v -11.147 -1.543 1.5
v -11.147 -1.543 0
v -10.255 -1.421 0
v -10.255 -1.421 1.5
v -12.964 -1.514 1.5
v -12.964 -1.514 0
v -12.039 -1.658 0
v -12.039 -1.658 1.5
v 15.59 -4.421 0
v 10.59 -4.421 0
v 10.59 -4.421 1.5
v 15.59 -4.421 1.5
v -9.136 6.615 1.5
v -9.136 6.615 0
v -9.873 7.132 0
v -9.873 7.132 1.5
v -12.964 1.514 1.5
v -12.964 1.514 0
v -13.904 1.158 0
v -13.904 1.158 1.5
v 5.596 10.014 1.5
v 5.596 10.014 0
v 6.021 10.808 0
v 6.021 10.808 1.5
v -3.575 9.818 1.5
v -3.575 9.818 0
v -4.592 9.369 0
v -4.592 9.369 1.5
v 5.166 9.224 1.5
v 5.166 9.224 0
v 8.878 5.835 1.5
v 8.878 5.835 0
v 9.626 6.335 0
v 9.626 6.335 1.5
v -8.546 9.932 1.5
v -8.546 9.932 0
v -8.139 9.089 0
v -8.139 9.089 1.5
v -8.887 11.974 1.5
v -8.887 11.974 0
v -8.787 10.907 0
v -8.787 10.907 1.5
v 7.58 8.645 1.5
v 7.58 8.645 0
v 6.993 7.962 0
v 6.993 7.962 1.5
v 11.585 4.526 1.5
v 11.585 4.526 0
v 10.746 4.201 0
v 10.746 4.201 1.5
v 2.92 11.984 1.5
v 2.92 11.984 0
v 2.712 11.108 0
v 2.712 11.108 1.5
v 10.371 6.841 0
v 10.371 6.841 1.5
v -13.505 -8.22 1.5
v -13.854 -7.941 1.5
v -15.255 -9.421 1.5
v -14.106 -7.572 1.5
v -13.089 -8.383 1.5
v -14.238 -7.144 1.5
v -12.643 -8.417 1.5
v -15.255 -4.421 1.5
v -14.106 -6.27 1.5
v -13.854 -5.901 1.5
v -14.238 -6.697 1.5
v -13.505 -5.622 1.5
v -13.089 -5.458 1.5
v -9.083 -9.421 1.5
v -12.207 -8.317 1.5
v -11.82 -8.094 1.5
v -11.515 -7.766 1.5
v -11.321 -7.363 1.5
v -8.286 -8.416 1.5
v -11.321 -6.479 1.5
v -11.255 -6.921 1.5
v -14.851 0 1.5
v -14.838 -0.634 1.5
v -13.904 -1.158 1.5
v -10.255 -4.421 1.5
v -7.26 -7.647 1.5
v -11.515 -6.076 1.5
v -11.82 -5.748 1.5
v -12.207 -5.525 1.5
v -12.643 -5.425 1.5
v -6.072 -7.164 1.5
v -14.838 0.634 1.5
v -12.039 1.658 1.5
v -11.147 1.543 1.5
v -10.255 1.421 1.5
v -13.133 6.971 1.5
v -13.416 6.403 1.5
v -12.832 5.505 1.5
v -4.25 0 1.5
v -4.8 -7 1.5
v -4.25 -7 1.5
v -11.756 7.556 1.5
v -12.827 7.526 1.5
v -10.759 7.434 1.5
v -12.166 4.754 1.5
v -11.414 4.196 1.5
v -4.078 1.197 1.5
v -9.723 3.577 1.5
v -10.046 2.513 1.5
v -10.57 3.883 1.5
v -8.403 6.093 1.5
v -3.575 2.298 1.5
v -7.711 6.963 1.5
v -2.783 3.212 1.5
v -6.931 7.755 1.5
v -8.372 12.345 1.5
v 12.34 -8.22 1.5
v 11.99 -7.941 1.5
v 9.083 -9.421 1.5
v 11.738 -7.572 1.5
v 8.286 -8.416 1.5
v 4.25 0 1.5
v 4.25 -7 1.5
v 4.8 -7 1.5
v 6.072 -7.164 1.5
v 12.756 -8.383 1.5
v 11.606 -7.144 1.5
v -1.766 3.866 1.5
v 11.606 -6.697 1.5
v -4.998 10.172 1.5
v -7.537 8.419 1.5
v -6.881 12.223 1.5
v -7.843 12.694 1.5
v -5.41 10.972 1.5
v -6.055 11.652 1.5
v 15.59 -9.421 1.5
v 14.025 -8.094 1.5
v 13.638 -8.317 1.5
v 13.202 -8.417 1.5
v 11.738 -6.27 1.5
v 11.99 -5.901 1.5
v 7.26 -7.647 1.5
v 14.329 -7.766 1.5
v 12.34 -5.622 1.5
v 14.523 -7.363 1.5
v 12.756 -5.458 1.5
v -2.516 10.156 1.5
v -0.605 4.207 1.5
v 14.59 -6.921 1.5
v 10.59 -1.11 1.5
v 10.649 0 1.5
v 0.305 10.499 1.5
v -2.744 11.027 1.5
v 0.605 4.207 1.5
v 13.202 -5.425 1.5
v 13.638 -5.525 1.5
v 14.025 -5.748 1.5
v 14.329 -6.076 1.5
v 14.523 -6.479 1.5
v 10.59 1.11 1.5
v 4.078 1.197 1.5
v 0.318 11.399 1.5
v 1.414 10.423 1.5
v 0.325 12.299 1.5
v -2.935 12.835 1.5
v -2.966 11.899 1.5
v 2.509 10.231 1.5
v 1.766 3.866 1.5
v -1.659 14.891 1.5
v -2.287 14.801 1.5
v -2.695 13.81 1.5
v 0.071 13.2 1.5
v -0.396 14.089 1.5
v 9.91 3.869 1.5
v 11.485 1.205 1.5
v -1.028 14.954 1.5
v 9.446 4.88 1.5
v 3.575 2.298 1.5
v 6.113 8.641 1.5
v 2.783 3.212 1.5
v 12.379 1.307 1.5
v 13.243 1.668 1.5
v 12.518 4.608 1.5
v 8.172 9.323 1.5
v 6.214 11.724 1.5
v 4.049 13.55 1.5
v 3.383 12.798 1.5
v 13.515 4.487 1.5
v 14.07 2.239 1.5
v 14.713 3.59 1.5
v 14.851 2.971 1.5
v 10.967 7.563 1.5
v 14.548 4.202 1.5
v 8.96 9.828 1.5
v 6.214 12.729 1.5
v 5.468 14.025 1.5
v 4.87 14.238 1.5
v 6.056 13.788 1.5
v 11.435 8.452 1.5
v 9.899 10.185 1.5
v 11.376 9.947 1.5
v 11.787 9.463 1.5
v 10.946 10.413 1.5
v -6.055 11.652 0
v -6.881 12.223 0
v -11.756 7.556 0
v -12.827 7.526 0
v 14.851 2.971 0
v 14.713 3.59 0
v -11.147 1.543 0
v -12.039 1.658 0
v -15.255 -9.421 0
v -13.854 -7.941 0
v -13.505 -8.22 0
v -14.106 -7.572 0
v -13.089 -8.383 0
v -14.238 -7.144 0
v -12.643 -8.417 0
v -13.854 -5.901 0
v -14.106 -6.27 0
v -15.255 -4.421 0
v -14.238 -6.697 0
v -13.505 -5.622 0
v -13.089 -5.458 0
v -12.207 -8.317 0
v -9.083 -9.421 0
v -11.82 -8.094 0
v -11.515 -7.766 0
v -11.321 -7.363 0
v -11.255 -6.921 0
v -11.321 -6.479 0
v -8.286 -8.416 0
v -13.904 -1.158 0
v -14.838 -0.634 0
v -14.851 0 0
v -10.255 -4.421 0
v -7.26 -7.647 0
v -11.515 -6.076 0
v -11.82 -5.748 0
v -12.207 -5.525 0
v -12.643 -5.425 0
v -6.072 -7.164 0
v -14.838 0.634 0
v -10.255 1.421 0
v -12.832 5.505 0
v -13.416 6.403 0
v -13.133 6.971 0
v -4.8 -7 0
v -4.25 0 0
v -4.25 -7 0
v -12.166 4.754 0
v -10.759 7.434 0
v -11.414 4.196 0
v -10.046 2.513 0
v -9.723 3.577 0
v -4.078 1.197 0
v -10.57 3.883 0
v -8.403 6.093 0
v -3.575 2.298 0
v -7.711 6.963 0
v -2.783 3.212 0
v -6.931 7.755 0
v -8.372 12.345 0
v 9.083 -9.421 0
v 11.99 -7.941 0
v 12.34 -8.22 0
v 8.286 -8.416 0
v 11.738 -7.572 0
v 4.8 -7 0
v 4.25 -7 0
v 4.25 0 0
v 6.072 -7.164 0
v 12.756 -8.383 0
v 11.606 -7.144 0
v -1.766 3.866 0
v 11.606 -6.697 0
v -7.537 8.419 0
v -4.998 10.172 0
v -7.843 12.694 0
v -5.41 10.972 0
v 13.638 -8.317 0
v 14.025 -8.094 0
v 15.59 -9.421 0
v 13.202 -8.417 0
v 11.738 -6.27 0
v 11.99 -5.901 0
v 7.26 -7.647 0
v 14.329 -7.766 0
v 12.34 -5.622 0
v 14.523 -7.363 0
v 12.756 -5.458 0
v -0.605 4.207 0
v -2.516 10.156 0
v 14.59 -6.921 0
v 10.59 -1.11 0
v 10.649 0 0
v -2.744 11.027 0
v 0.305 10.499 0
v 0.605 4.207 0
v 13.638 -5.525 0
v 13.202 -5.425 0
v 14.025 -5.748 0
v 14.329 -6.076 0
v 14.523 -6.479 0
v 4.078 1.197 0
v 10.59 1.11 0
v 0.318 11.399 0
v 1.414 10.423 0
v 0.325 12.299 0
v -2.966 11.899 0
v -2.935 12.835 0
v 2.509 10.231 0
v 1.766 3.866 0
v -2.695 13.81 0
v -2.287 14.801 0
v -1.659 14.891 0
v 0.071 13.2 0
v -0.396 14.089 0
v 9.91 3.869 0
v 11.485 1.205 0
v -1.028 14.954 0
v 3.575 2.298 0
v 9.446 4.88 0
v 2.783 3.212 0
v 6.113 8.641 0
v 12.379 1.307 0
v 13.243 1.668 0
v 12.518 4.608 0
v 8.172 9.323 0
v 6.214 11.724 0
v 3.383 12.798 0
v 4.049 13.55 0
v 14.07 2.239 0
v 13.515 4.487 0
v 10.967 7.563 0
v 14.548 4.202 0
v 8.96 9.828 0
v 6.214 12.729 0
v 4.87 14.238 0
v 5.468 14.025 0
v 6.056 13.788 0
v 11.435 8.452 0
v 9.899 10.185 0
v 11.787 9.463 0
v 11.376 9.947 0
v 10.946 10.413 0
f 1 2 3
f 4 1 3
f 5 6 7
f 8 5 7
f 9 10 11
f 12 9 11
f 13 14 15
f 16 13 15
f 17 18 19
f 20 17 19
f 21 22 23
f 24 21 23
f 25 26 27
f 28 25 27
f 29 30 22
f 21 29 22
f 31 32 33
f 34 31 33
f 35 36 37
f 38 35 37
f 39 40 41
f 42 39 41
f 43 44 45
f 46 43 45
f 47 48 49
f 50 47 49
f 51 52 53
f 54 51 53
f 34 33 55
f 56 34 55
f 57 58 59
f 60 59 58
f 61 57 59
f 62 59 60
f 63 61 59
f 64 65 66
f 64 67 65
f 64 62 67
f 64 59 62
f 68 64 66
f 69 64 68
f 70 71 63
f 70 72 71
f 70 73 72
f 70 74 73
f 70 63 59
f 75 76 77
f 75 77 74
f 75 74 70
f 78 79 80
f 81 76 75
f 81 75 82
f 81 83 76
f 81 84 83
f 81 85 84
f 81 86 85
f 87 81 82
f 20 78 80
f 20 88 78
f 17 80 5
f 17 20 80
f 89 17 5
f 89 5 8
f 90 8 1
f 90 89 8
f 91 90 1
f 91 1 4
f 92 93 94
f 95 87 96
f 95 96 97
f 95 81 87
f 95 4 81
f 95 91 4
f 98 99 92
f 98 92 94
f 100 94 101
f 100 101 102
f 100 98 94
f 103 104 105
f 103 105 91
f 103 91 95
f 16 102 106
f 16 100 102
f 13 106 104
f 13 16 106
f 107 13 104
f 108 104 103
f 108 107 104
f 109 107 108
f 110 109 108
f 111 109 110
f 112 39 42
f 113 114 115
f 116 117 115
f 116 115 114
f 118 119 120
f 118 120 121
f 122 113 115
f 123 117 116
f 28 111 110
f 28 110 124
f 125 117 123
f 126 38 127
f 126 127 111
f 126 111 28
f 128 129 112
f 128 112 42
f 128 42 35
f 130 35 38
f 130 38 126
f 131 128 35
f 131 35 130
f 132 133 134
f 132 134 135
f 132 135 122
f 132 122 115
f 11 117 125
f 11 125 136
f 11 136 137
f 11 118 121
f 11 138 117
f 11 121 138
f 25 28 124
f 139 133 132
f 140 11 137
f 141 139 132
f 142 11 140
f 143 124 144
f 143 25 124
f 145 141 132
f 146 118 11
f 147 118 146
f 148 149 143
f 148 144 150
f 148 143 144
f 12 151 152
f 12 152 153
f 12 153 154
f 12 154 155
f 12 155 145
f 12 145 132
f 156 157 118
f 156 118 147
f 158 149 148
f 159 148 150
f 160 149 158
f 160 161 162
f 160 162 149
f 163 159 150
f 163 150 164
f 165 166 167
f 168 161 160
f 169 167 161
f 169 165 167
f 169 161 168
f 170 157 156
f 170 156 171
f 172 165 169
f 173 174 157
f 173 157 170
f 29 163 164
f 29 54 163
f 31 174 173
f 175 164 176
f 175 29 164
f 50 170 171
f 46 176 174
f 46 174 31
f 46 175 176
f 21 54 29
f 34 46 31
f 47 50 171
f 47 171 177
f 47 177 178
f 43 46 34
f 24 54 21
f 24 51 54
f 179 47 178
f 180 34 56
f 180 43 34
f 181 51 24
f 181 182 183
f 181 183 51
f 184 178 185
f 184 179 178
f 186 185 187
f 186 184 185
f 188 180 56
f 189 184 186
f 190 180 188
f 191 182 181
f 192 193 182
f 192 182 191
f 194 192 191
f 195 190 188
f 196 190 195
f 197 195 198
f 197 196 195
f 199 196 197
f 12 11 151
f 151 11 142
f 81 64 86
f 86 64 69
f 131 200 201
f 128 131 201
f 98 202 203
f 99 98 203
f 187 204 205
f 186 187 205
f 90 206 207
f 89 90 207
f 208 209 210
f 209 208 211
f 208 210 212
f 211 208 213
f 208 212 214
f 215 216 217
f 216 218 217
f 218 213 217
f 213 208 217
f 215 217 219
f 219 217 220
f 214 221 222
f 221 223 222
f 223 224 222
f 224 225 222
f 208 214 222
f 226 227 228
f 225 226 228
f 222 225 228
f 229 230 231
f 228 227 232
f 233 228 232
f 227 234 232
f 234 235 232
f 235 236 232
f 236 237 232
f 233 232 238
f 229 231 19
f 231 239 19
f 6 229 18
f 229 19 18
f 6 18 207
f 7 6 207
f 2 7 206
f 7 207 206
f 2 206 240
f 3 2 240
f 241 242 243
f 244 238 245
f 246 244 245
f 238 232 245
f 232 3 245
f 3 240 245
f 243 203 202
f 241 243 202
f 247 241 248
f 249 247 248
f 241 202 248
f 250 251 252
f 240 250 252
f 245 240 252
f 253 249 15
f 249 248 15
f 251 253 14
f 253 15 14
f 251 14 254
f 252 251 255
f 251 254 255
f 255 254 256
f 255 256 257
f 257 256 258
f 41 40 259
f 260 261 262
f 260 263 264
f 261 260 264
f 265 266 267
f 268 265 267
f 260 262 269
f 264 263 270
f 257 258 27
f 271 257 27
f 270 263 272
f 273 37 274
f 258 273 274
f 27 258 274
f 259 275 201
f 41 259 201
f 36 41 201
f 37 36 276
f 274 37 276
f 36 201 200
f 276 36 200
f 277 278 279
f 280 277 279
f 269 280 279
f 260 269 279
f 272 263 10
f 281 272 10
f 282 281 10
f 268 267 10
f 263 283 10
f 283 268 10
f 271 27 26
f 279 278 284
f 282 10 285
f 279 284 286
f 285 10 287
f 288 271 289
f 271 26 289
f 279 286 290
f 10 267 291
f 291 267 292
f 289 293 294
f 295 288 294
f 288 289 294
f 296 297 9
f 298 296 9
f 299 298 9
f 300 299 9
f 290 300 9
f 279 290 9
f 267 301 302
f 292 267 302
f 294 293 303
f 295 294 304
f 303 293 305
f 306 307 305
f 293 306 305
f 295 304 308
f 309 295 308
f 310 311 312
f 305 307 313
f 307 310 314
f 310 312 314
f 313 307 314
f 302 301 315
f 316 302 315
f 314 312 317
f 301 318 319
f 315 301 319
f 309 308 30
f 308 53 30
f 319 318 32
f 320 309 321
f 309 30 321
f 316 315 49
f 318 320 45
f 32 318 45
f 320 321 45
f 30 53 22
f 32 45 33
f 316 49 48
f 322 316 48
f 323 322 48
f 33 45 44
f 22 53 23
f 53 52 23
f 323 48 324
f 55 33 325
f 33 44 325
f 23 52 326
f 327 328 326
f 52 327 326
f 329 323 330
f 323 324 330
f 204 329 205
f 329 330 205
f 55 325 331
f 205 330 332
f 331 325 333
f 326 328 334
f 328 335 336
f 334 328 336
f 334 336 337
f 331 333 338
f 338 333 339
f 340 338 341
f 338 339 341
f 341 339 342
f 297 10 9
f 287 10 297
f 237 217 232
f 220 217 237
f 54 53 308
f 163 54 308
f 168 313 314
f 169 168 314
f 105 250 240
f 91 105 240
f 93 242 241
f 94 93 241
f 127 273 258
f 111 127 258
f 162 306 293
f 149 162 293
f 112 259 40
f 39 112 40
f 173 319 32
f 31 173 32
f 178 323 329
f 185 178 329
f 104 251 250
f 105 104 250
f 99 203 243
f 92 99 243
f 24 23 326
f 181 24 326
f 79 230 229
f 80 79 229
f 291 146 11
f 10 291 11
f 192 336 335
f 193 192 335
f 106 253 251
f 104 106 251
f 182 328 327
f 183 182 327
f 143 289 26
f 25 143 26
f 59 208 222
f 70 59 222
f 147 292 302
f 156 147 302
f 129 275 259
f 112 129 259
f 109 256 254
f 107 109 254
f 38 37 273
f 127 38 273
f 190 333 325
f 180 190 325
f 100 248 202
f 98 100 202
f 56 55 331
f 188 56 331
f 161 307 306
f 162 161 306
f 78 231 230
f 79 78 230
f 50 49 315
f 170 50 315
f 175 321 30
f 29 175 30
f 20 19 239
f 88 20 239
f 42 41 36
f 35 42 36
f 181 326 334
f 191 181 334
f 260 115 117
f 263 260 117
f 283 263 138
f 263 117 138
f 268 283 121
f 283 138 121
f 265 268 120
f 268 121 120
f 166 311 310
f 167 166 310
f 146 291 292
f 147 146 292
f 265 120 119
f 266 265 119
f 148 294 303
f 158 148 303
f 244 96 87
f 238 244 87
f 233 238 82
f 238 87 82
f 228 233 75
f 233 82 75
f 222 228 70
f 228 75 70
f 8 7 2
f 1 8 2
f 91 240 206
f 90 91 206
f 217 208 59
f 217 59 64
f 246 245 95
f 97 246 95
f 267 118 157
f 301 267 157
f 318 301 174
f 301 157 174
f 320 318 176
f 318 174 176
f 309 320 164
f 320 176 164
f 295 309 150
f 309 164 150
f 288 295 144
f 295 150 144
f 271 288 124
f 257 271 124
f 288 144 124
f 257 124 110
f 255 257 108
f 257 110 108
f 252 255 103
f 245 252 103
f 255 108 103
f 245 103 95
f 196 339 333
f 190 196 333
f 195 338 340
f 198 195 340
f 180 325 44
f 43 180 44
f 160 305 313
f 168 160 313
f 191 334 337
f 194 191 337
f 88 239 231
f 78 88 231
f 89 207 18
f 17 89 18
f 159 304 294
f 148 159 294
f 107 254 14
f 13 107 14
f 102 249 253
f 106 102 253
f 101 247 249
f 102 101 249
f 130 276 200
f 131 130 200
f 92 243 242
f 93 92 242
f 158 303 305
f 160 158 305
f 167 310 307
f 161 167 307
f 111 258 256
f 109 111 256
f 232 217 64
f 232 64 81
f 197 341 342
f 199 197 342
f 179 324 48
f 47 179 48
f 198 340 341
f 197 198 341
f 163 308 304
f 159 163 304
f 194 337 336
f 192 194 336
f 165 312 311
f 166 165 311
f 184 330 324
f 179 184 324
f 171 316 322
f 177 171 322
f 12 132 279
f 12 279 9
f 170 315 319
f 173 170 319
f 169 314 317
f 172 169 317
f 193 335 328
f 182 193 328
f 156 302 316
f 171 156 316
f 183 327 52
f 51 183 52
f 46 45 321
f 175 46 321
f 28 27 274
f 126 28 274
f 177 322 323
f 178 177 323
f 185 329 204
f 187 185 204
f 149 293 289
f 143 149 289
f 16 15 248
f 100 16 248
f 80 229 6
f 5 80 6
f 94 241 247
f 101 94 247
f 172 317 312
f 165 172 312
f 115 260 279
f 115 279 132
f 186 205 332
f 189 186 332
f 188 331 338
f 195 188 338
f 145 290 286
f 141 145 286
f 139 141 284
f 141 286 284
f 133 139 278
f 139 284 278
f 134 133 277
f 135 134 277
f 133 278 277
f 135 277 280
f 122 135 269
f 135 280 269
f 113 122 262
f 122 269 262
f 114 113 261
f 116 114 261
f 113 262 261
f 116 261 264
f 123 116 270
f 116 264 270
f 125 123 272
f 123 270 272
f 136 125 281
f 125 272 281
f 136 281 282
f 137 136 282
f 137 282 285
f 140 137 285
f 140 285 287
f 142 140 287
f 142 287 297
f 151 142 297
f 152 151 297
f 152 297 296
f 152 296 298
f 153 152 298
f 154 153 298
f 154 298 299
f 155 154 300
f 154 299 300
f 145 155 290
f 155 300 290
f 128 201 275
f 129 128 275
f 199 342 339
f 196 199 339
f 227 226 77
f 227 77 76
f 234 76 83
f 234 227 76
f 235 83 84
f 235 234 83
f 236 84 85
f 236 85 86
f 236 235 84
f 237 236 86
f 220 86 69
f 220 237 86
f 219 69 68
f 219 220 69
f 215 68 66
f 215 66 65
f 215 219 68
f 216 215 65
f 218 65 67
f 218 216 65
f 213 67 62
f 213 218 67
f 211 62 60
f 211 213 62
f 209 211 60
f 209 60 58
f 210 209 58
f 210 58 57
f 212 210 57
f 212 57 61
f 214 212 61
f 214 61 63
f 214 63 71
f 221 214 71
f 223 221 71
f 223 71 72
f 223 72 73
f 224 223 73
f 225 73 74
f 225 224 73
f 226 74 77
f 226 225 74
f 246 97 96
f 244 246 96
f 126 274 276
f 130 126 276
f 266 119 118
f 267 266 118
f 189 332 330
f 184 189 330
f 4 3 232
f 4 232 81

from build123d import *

# Parameters (mm, degrees)
F1_DEPTH  = 1.5
F3_DEPTH  = 1.5
F4_W      = 6.004848
F4_H      = 1.5
F4_W_2    = 6.339723
F5_DEPTH  = 8
F6_W      = 5
F6_H      = 1.5
F7_DEPTH  = 5
F8_R      = 1.5
F9_DEPTH  = 1.5
F10_W     = 5
F10_H     = 5
F10_R     = 1.5
F11_DEPTH = 1.5
F13_DEPTH = 1.5


with BuildPart() as f1:
    # F0 (on Top) → F1 (new body)
    with BuildSketch(Plane.XY):
        Polygon((10.589723, -1.110145), (10.648575, 0), (10.589723, 1.110145), (11.484679, 1.205301), (12.378936, 1.30701), (13.242702, 1.66848), (14.069737, 2.238581), (14.851424, 2.970895), (14.712702, 3.589735), (14.547945, 4.202158), (13.515472, 4.487322), (12.51823, 4.607779), (11.58542, 4.526432), (10.746328, 4.200909), (9.909663, 3.869259), (9.445863, 4.879593), (8.877842, 5.835228), (9.626065, 6.335391), (10.370624, 6.841032), (10.967468, 7.56251), (11.434831, 8.451652), (11.786658, 9.463352), (11.376236, 9.94684), (10.945744, 10.412547), (9.899012, 10.185233), (8.960019, 9.828451), (8.17186, 9.322923), (7.580159, 8.644742), (6.993455, 7.962262), (6.113255, 8.641331), (5.166192, 9.223531), (5.596273, 10.014119), (6.020563, 10.807856), (6.213755, 11.72406), (6.21438, 12.728551), (6.055747, 13.787869), (5.467648, 14.025244), (4.870041, 14.237547), (4.048845, 13.54983), (3.383212, 12.797544), (2.920263, 11.983645), (2.711504, 11.108168), (2.509167, 10.231207), (1.41421, 10.423443), (0.305065, 10.498834), (0.318479, 11.398734), (0.325301, 12.29873), (0.070583, 13.19977), (-0.395674, 14.089492), (-1.028426, 14.953751), (-1.659475, 14.890633), (-2.287292, 14.800897), (-2.694828, 13.810324), (-2.934611, 12.834873), (-2.966295, 11.899058), (-2.744287, 11.026847), (-2.515903, 10.156306), (-3.574776, 9.817671), (-4.591911, 9.36898), (-4.998239, 10.172036), (-5.410447, 10.972114), (-6.054722, 11.651571), (-6.881047, 12.222701), (-7.842962, 12.693909), (-8.372396, 12.344758), (-8.886598, 11.973539), (-8.787111, 10.90704), (-8.546113, 9.931888), (-8.139273, 9.088541), (-7.537358, 8.419408), (-6.930574, 7.754718), (-7.710788, 6.962788), (-8.402899, 6.092806), (-9.135883, 6.615047), (-9.87269, 7.131918), (-10.758927, 7.434137), (-11.756018, 7.555836), (-12.826734, 7.526046), (-13.133265, 6.970848), (-13.416055, 6.403188), (-12.832336, 5.505084), (-12.165768, 4.753627), (-11.413606, 4.195948), (-10.569675, 3.883184), (-9.723497, 3.576617), (-10.046314, 2.512814), (-10.254848, 1.420844), (-11.14657, 1.54263), (-12.039182, 1.657886), (-12.964354, 1.513633), (-13.903791, 1.15802), (-14.838018, 0.634056), (-14.851425, 0), (-14.838018, -0.634056), (-13.903791, -1.15802), (-12.964354, -1.513633), (-12.039182, -1.657886), (-11.14657, -1.54263), (-10.254848, -1.420844), (-10.046314, -2.512814), (-9.723497, -3.576617), (-10.569675, -3.883184), (-11.413606, -4.195948), (-12.165768, -4.753627), (-12.832336, -5.505084), (-13.416055, -6.403188), (-13.133265, -6.970848), (-12.826734, -7.526046), (-11.756018, -7.555836), (-10.758927, -7.434137), (-9.87269, -7.131918), (-9.135883, -6.615047), (-8.402899, -6.092806), (-7.710788, -6.962788), (-6.930574, -7.754718), (-7.537358, -8.419408), (-8.139273, -9.088541), (-8.546113, -9.931888), (-8.787111, -10.90704), (-8.886598, -11.973539), (-8.372396, -12.344758), (-7.842962, -12.693909), (-6.881047, -12.222701), (-6.054722, -11.651571), (-5.410447, -10.972114), (-4.998239, -10.172036), (-4.591911, -9.36898), (-3.574776, -9.817671), (-2.515903, -10.156306), (-2.744287, -11.026847), (-2.966295, -11.899058), (-2.934611, -12.834873), (-2.694828, -13.810324), (-2.287292, -14.800897), (-1.659475, -14.890633), (-1.028426, -14.953751), (-0.395674, -14.089492), (0.070583, -13.19977), (0.325301, -12.29873), (0.318479, -11.398734), (0.305065, -10.498834), (1.41421, -10.423443), (2.509167, -10.231207), (2.711504, -11.108168), (2.920263, -11.983645), (3.383212, -12.797544), (4.048845, -13.54983), (4.870041, -14.237547), (5.467648, -14.025244), (6.055747, -13.787869), (6.21438, -12.728551), (6.213755, -11.72406), (6.020563, -10.807856), (5.596273, -10.014119), (5.166192, -9.223531), (6.113255, -8.641331), (6.993455, -7.962262), (7.580159, -8.644742), (8.17186, -9.322923), (8.960019, -9.828451), (9.899012, -10.185233), (10.945744, -10.412547), (11.376236, -9.94684), (11.786658, -9.463352), (11.434831, -8.451652), (10.967468, -7.56251), (10.370624, -6.841032), (9.626065, -6.335391), (8.877842, -5.835228), (9.445863, -4.879593), (9.909663, -3.869259), (10.746328, -4.200909), (11.58542, -4.526432), (12.51823, -4.607779), (13.515472, -4.487322), (14.547945, -4.202158), (14.712702, -3.589735), (14.851424, -2.970895), (14.069737, -2.238581), (13.242702, -1.66848), (12.378936, -1.30701), (11.484679, -1.205301), align=None)
    extrude(amount=F1_DEPTH)

    # F2 (on face) → F3 (cut, through all)
    with BuildSketch(Plane.XY.offset(1.5)):
        with BuildLine():
            Line((4.25, -1.420844), (4.25, 0))
            ThreePointArc((4.25, 0), (0, 4.25), (-4.25, 0))
            Line((-4.25, 0), (-4.25, -1.420844))
            Line((-4.25, -1.420844), (-10.254848, -1.420844))
            Line((-10.254848, -1.420844), (-10.046314, -2.512814))
            Line((-10.046314, -2.512814), (-9.723497, -3.576617))
            Line((-9.723497, -3.576617), (-10.569675, -3.883184))
            Line((-10.569675, -3.883184), (-11.413606, -4.195948))
            Line((-11.413606, -4.195948), (-12.165768, -4.753627))
            Line((-12.165768, -4.753627), (-12.832336, -5.505084))
            Line((-12.832336, -5.505084), (-13.416055, -6.403188))
            Line((-13.416055, -6.403188), (-13.133265, -6.970848))
            Line((-13.133265, -6.970848), (-12.826734, -7.526046))
            Line((-12.826734, -7.526046), (-11.756018, -7.555836))
            Line((-11.756018, -7.555836), (-10.758927, -7.434137))
            Line((-10.758927, -7.434137), (-9.87269, -7.131918))
            Line((-9.87269, -7.131918), (-9.135883, -6.615047))
            Line((-9.135883, -6.615047), (-8.402899, -6.092806))
            Line((-8.402899, -6.092806), (-7.710788, -6.962788))
            Line((-7.710788, -6.962788), (-6.930574, -7.754718))
            Line((-6.930574, -7.754718), (-7.537358, -8.419408))
            Line((-7.537358, -8.419408), (-8.139273, -9.088541))
            Line((-8.139273, -9.088541), (-8.546113, -9.931888))
            Line((-8.546113, -9.931888), (-8.787111, -10.90704))
            Line((-8.787111, -10.90704), (-8.886598, -11.973539))
            Line((-8.886598, -11.973539), (-8.372396, -12.344758))
            Line((-8.372396, -12.344758), (-7.842962, -12.693909))
            Line((-7.842962, -12.693909), (-6.881047, -12.222701))
            Line((-6.881047, -12.222701), (-6.054722, -11.651571))
            Line((-6.054722, -11.651571), (-5.410447, -10.972114))
            Line((-5.410447, -10.972114), (-4.998239, -10.172036))
            Line((-4.998239, -10.172036), (-4.591911, -9.36898))
            Line((-4.591911, -9.36898), (-3.574776, -9.817671))
            Line((-3.574776, -9.817671), (-2.515903, -10.156306))
            Line((-2.515903, -10.156306), (-2.744287, -11.026847))
            Line((-2.744287, -11.026847), (-2.966295, -11.899058))
            Line((-2.966295, -11.899058), (-2.934611, -12.834873))
            Line((-2.934611, -12.834873), (-2.694828, -13.810324))
            Line((-2.694828, -13.810324), (-2.287292, -14.800897))
            Line((-2.287292, -14.800897), (-1.659475, -14.890633))
            Line((-1.659475, -14.890633), (-1.028426, -14.953751))
            Line((-1.028426, -14.953751), (-0.395674, -14.089492))
            Line((-0.395674, -14.089492), (0.070583, -13.19977))
            Line((0.070583, -13.19977), (0.325301, -12.29873))
            Line((0.325301, -12.29873), (0.318479, -11.398734))
            Line((0.318479, -11.398734), (0.305065, -10.498834))
            Line((0.305065, -10.498834), (1.41421, -10.423443))
            Line((1.41421, -10.423443), (2.509167, -10.231207))
            Line((2.509167, -10.231207), (2.711504, -11.108168))
            Line((2.711504, -11.108168), (2.920263, -11.983645))
            Line((2.920263, -11.983645), (3.383212, -12.797544))
            Line((3.383212, -12.797544), (4.048845, -13.54983))
            Line((4.048845, -13.54983), (4.870041, -14.237547))
            Line((4.870041, -14.237547), (5.467648, -14.025244))
            Line((5.467648, -14.025244), (6.055747, -13.787869))
            Line((6.055747, -13.787869), (6.21438, -12.728551))
            Line((6.21438, -12.728551), (6.213755, -11.72406))
            Line((6.213755, -11.72406), (6.020563, -10.807856))
            Line((6.020563, -10.807856), (5.596273, -10.014119))
            Line((5.596273, -10.014119), (5.166192, -9.223531))
            Line((5.166192, -9.223531), (6.113255, -8.641331))
            Line((6.113255, -8.641331), (6.993455, -7.962262))
            Line((6.993455, -7.962262), (7.580159, -8.644742))
            Line((7.580159, -8.644742), (8.17186, -9.322923))
            Line((8.17186, -9.322923), (8.960019, -9.828451))
            Line((8.960019, -9.828451), (9.899012, -10.185233))
            Line((9.899012, -10.185233), (10.945744, -10.412547))
            Line((10.945744, -10.412547), (11.376236, -9.94684))
            Line((11.376236, -9.94684), (11.786658, -9.463352))
            Line((11.786658, -9.463352), (11.434831, -8.451652))
            Line((11.434831, -8.451652), (10.967468, -7.56251))
            Line((10.967468, -7.56251), (10.370624, -6.841032))
            Line((10.370624, -6.841032), (9.626065, -6.335391))
            Line((9.626065, -6.335391), (8.877842, -5.835228))
            Line((8.877842, -5.835228), (9.445863, -4.879593))
            Line((9.445863, -4.879593), (9.909663, -3.869259))
            Line((9.909663, -3.869259), (10.746328, -4.200909))
            Line((10.746328, -4.200909), (11.58542, -4.526432))
            Line((11.58542, -4.526432), (12.51823, -4.607779))
            Line((12.51823, -4.607779), (13.515472, -4.487322))
            Line((13.515472, -4.487322), (14.547945, -4.202158))
            Line((14.547945, -4.202158), (14.712702, -3.589735))
            Line((14.712702, -3.589735), (14.851424, -2.970895))
            Line((14.851424, -2.970895), (14.069737, -2.238581))
            Line((14.069737, -2.238581), (13.242702, -1.66848))
            Line((13.242702, -1.66848), (12.378936, -1.30701))
            Line((12.378936, -1.30701), (11.484679, -1.205301))
            Line((11.484679, -1.205301), (10.589723, -1.110145))
            Line((10.589723, -1.110145), (10.589723, -1.420844))
            Line((10.589723, -1.420844), (4.25, -1.420844))
        make_face()
    extrude(amount=-F3_DEPTH, mode=Mode.SUBTRACT)

    # F4 (on face) → F5 (join)
    with BuildSketch(Plane.XZ.offset(1.420844)):
        with Locations((-7.252424, 0.75)):
            Rectangle(F4_W, F4_H)
        with Locations((7.4198615, 0.75)):
            Rectangle(F4_W_2, F4_H)
    extrude(amount=F5_DEPTH)

    # F6 (on face) → F7 (join)
    with BuildSketch(Plane.YZ.offset(10.589723)):
        with Locations((-6.920844, 0.75)):
            Rectangle(F6_W, F6_H)
    extrude(amount=F7_DEPTH)

    # F8 (on face) → F9 (cut, through all)
    with BuildSketch(Plane(origin=(0, 0, 0), x_dir=(1, 0, 0), z_dir=(0, 0, -1))):
        with Locations((13.089723, 6.920844)):
            Circle(F8_R)
    extrude(amount=-F9_DEPTH, mode=Mode.SUBTRACT)

    # F10 (on Top) → F11 (join)
    with BuildSketch(Plane.XY):
        with Locations((-12.754848, -6.920844)):
            Rectangle(F10_W, F10_H)
        with Locations((-12.754848, -6.920844)):
            Circle(F10_R, mode=Mode.SUBTRACT)
    extrude(amount=F11_DEPTH)

    # F12 (on face) → F13 (cut, through all)
    with BuildSketch(Plane.XY.offset(1.5)):
        with BuildLine():
            Line((-4.25, -7), (-4.8, -7))
            ThreePointArc((-4.8, -7), (-7.2601036564, -7.6470825875), (-9.0834512169, -9.420844))
            Line((-9.0834512169, -9.420844), (-4.25, -9.420844))
            Line((-4.25, -9.420844), (-4.25, -7))
        make_face()
        with BuildLine():
            Line((4.8, -7), (4.25, -7))
            Line((4.25, -7), (4.25, -9.420844))
            Line((4.25, -9.420844), (9.0834512169, -9.420844))
            ThreePointArc((9.0834512169, -9.420844), (7.2601036564, -7.6470825875), (4.8, -7))
        make_face()
    extrude(amount=-F13_DEPTH, mode=Mode.SUBTRACT)


solid = f1.part
